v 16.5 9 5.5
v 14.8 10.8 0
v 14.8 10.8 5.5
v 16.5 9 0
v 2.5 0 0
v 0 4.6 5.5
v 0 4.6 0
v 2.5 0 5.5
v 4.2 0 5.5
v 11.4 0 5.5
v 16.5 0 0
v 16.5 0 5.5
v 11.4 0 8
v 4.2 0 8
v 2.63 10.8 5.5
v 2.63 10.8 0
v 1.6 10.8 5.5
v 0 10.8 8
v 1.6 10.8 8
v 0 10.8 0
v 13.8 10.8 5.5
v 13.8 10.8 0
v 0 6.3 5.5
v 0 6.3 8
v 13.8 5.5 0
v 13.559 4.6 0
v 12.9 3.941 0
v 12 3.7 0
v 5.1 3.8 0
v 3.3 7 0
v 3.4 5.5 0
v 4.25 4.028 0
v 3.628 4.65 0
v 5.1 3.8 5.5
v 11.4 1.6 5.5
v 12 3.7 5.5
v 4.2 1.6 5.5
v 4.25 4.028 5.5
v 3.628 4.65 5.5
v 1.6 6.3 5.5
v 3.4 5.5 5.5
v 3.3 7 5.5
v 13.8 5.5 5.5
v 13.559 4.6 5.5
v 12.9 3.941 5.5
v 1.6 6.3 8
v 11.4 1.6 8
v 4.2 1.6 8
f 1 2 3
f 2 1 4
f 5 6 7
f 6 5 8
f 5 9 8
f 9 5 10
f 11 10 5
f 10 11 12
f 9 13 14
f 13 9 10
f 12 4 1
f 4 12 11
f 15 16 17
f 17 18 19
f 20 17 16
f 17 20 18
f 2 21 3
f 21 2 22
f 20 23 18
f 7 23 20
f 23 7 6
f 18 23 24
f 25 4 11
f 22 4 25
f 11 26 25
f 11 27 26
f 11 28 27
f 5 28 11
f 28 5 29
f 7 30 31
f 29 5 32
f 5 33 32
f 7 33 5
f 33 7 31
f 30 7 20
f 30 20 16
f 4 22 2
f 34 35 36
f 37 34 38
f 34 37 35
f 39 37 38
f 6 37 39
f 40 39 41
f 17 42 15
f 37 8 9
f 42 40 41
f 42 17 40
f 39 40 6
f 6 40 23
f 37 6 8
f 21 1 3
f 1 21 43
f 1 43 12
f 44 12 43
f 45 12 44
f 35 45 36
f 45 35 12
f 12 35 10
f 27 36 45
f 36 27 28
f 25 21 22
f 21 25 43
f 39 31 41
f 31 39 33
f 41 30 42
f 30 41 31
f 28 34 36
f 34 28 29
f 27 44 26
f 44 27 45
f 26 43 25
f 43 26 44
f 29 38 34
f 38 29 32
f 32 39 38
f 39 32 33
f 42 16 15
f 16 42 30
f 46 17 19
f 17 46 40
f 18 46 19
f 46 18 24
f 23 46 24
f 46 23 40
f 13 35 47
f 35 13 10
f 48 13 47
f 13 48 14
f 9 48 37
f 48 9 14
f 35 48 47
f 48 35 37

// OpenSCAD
//
// toto_base_tooth.scad
// For use with washlets such as C200
//
// The original tooth is an aluminum part, but not everyone has
// chunks of aluminum laying around the house. ABS seems to work,
// just make sure to use an 80% fill.

body_h = 5.5;

module main () {

    // The main body
    difference () {

        // The general square outline
        hull () {
            translate([0, 4.6, 0])
                cube([14.8, 6.2, body_h]);
            translate([2.5, 0.0, 0])
                cube([14.0, 9.0, body_h]);
        }

        // The main cut-out with radii
        hull () {
            translate([5.1, 5.5, -0.1])
                cylinder(body_h + 0.2, 1.7, 1.7, $fn=12);
            translate([12.0, 5.5, -0.1])
                cylinder(body_h + 0.2, 1.8, 1.8, $fn=12);

            translate([3.3, 7.0, -0.1])
                cube([10.5, 6.0, body_h + 0.2]);
        }

        // A slight angled cut
        translate([3.3, 7.0, -0.1])
            rotate(10, [0,0,1])
                cube([3, 5, body_h + 0.2]);
    }

    // The tabs
    // We made tabs shorter than original in order to prevent breakage.
    translate([0.0, 6.3, 0])
        cube([1.6, 4.5, body_h + 2.5]);
    translate([4.2, 0.0, 0])
        cube([7.2, 1.6, body_h + 2.5]);
}

main();
